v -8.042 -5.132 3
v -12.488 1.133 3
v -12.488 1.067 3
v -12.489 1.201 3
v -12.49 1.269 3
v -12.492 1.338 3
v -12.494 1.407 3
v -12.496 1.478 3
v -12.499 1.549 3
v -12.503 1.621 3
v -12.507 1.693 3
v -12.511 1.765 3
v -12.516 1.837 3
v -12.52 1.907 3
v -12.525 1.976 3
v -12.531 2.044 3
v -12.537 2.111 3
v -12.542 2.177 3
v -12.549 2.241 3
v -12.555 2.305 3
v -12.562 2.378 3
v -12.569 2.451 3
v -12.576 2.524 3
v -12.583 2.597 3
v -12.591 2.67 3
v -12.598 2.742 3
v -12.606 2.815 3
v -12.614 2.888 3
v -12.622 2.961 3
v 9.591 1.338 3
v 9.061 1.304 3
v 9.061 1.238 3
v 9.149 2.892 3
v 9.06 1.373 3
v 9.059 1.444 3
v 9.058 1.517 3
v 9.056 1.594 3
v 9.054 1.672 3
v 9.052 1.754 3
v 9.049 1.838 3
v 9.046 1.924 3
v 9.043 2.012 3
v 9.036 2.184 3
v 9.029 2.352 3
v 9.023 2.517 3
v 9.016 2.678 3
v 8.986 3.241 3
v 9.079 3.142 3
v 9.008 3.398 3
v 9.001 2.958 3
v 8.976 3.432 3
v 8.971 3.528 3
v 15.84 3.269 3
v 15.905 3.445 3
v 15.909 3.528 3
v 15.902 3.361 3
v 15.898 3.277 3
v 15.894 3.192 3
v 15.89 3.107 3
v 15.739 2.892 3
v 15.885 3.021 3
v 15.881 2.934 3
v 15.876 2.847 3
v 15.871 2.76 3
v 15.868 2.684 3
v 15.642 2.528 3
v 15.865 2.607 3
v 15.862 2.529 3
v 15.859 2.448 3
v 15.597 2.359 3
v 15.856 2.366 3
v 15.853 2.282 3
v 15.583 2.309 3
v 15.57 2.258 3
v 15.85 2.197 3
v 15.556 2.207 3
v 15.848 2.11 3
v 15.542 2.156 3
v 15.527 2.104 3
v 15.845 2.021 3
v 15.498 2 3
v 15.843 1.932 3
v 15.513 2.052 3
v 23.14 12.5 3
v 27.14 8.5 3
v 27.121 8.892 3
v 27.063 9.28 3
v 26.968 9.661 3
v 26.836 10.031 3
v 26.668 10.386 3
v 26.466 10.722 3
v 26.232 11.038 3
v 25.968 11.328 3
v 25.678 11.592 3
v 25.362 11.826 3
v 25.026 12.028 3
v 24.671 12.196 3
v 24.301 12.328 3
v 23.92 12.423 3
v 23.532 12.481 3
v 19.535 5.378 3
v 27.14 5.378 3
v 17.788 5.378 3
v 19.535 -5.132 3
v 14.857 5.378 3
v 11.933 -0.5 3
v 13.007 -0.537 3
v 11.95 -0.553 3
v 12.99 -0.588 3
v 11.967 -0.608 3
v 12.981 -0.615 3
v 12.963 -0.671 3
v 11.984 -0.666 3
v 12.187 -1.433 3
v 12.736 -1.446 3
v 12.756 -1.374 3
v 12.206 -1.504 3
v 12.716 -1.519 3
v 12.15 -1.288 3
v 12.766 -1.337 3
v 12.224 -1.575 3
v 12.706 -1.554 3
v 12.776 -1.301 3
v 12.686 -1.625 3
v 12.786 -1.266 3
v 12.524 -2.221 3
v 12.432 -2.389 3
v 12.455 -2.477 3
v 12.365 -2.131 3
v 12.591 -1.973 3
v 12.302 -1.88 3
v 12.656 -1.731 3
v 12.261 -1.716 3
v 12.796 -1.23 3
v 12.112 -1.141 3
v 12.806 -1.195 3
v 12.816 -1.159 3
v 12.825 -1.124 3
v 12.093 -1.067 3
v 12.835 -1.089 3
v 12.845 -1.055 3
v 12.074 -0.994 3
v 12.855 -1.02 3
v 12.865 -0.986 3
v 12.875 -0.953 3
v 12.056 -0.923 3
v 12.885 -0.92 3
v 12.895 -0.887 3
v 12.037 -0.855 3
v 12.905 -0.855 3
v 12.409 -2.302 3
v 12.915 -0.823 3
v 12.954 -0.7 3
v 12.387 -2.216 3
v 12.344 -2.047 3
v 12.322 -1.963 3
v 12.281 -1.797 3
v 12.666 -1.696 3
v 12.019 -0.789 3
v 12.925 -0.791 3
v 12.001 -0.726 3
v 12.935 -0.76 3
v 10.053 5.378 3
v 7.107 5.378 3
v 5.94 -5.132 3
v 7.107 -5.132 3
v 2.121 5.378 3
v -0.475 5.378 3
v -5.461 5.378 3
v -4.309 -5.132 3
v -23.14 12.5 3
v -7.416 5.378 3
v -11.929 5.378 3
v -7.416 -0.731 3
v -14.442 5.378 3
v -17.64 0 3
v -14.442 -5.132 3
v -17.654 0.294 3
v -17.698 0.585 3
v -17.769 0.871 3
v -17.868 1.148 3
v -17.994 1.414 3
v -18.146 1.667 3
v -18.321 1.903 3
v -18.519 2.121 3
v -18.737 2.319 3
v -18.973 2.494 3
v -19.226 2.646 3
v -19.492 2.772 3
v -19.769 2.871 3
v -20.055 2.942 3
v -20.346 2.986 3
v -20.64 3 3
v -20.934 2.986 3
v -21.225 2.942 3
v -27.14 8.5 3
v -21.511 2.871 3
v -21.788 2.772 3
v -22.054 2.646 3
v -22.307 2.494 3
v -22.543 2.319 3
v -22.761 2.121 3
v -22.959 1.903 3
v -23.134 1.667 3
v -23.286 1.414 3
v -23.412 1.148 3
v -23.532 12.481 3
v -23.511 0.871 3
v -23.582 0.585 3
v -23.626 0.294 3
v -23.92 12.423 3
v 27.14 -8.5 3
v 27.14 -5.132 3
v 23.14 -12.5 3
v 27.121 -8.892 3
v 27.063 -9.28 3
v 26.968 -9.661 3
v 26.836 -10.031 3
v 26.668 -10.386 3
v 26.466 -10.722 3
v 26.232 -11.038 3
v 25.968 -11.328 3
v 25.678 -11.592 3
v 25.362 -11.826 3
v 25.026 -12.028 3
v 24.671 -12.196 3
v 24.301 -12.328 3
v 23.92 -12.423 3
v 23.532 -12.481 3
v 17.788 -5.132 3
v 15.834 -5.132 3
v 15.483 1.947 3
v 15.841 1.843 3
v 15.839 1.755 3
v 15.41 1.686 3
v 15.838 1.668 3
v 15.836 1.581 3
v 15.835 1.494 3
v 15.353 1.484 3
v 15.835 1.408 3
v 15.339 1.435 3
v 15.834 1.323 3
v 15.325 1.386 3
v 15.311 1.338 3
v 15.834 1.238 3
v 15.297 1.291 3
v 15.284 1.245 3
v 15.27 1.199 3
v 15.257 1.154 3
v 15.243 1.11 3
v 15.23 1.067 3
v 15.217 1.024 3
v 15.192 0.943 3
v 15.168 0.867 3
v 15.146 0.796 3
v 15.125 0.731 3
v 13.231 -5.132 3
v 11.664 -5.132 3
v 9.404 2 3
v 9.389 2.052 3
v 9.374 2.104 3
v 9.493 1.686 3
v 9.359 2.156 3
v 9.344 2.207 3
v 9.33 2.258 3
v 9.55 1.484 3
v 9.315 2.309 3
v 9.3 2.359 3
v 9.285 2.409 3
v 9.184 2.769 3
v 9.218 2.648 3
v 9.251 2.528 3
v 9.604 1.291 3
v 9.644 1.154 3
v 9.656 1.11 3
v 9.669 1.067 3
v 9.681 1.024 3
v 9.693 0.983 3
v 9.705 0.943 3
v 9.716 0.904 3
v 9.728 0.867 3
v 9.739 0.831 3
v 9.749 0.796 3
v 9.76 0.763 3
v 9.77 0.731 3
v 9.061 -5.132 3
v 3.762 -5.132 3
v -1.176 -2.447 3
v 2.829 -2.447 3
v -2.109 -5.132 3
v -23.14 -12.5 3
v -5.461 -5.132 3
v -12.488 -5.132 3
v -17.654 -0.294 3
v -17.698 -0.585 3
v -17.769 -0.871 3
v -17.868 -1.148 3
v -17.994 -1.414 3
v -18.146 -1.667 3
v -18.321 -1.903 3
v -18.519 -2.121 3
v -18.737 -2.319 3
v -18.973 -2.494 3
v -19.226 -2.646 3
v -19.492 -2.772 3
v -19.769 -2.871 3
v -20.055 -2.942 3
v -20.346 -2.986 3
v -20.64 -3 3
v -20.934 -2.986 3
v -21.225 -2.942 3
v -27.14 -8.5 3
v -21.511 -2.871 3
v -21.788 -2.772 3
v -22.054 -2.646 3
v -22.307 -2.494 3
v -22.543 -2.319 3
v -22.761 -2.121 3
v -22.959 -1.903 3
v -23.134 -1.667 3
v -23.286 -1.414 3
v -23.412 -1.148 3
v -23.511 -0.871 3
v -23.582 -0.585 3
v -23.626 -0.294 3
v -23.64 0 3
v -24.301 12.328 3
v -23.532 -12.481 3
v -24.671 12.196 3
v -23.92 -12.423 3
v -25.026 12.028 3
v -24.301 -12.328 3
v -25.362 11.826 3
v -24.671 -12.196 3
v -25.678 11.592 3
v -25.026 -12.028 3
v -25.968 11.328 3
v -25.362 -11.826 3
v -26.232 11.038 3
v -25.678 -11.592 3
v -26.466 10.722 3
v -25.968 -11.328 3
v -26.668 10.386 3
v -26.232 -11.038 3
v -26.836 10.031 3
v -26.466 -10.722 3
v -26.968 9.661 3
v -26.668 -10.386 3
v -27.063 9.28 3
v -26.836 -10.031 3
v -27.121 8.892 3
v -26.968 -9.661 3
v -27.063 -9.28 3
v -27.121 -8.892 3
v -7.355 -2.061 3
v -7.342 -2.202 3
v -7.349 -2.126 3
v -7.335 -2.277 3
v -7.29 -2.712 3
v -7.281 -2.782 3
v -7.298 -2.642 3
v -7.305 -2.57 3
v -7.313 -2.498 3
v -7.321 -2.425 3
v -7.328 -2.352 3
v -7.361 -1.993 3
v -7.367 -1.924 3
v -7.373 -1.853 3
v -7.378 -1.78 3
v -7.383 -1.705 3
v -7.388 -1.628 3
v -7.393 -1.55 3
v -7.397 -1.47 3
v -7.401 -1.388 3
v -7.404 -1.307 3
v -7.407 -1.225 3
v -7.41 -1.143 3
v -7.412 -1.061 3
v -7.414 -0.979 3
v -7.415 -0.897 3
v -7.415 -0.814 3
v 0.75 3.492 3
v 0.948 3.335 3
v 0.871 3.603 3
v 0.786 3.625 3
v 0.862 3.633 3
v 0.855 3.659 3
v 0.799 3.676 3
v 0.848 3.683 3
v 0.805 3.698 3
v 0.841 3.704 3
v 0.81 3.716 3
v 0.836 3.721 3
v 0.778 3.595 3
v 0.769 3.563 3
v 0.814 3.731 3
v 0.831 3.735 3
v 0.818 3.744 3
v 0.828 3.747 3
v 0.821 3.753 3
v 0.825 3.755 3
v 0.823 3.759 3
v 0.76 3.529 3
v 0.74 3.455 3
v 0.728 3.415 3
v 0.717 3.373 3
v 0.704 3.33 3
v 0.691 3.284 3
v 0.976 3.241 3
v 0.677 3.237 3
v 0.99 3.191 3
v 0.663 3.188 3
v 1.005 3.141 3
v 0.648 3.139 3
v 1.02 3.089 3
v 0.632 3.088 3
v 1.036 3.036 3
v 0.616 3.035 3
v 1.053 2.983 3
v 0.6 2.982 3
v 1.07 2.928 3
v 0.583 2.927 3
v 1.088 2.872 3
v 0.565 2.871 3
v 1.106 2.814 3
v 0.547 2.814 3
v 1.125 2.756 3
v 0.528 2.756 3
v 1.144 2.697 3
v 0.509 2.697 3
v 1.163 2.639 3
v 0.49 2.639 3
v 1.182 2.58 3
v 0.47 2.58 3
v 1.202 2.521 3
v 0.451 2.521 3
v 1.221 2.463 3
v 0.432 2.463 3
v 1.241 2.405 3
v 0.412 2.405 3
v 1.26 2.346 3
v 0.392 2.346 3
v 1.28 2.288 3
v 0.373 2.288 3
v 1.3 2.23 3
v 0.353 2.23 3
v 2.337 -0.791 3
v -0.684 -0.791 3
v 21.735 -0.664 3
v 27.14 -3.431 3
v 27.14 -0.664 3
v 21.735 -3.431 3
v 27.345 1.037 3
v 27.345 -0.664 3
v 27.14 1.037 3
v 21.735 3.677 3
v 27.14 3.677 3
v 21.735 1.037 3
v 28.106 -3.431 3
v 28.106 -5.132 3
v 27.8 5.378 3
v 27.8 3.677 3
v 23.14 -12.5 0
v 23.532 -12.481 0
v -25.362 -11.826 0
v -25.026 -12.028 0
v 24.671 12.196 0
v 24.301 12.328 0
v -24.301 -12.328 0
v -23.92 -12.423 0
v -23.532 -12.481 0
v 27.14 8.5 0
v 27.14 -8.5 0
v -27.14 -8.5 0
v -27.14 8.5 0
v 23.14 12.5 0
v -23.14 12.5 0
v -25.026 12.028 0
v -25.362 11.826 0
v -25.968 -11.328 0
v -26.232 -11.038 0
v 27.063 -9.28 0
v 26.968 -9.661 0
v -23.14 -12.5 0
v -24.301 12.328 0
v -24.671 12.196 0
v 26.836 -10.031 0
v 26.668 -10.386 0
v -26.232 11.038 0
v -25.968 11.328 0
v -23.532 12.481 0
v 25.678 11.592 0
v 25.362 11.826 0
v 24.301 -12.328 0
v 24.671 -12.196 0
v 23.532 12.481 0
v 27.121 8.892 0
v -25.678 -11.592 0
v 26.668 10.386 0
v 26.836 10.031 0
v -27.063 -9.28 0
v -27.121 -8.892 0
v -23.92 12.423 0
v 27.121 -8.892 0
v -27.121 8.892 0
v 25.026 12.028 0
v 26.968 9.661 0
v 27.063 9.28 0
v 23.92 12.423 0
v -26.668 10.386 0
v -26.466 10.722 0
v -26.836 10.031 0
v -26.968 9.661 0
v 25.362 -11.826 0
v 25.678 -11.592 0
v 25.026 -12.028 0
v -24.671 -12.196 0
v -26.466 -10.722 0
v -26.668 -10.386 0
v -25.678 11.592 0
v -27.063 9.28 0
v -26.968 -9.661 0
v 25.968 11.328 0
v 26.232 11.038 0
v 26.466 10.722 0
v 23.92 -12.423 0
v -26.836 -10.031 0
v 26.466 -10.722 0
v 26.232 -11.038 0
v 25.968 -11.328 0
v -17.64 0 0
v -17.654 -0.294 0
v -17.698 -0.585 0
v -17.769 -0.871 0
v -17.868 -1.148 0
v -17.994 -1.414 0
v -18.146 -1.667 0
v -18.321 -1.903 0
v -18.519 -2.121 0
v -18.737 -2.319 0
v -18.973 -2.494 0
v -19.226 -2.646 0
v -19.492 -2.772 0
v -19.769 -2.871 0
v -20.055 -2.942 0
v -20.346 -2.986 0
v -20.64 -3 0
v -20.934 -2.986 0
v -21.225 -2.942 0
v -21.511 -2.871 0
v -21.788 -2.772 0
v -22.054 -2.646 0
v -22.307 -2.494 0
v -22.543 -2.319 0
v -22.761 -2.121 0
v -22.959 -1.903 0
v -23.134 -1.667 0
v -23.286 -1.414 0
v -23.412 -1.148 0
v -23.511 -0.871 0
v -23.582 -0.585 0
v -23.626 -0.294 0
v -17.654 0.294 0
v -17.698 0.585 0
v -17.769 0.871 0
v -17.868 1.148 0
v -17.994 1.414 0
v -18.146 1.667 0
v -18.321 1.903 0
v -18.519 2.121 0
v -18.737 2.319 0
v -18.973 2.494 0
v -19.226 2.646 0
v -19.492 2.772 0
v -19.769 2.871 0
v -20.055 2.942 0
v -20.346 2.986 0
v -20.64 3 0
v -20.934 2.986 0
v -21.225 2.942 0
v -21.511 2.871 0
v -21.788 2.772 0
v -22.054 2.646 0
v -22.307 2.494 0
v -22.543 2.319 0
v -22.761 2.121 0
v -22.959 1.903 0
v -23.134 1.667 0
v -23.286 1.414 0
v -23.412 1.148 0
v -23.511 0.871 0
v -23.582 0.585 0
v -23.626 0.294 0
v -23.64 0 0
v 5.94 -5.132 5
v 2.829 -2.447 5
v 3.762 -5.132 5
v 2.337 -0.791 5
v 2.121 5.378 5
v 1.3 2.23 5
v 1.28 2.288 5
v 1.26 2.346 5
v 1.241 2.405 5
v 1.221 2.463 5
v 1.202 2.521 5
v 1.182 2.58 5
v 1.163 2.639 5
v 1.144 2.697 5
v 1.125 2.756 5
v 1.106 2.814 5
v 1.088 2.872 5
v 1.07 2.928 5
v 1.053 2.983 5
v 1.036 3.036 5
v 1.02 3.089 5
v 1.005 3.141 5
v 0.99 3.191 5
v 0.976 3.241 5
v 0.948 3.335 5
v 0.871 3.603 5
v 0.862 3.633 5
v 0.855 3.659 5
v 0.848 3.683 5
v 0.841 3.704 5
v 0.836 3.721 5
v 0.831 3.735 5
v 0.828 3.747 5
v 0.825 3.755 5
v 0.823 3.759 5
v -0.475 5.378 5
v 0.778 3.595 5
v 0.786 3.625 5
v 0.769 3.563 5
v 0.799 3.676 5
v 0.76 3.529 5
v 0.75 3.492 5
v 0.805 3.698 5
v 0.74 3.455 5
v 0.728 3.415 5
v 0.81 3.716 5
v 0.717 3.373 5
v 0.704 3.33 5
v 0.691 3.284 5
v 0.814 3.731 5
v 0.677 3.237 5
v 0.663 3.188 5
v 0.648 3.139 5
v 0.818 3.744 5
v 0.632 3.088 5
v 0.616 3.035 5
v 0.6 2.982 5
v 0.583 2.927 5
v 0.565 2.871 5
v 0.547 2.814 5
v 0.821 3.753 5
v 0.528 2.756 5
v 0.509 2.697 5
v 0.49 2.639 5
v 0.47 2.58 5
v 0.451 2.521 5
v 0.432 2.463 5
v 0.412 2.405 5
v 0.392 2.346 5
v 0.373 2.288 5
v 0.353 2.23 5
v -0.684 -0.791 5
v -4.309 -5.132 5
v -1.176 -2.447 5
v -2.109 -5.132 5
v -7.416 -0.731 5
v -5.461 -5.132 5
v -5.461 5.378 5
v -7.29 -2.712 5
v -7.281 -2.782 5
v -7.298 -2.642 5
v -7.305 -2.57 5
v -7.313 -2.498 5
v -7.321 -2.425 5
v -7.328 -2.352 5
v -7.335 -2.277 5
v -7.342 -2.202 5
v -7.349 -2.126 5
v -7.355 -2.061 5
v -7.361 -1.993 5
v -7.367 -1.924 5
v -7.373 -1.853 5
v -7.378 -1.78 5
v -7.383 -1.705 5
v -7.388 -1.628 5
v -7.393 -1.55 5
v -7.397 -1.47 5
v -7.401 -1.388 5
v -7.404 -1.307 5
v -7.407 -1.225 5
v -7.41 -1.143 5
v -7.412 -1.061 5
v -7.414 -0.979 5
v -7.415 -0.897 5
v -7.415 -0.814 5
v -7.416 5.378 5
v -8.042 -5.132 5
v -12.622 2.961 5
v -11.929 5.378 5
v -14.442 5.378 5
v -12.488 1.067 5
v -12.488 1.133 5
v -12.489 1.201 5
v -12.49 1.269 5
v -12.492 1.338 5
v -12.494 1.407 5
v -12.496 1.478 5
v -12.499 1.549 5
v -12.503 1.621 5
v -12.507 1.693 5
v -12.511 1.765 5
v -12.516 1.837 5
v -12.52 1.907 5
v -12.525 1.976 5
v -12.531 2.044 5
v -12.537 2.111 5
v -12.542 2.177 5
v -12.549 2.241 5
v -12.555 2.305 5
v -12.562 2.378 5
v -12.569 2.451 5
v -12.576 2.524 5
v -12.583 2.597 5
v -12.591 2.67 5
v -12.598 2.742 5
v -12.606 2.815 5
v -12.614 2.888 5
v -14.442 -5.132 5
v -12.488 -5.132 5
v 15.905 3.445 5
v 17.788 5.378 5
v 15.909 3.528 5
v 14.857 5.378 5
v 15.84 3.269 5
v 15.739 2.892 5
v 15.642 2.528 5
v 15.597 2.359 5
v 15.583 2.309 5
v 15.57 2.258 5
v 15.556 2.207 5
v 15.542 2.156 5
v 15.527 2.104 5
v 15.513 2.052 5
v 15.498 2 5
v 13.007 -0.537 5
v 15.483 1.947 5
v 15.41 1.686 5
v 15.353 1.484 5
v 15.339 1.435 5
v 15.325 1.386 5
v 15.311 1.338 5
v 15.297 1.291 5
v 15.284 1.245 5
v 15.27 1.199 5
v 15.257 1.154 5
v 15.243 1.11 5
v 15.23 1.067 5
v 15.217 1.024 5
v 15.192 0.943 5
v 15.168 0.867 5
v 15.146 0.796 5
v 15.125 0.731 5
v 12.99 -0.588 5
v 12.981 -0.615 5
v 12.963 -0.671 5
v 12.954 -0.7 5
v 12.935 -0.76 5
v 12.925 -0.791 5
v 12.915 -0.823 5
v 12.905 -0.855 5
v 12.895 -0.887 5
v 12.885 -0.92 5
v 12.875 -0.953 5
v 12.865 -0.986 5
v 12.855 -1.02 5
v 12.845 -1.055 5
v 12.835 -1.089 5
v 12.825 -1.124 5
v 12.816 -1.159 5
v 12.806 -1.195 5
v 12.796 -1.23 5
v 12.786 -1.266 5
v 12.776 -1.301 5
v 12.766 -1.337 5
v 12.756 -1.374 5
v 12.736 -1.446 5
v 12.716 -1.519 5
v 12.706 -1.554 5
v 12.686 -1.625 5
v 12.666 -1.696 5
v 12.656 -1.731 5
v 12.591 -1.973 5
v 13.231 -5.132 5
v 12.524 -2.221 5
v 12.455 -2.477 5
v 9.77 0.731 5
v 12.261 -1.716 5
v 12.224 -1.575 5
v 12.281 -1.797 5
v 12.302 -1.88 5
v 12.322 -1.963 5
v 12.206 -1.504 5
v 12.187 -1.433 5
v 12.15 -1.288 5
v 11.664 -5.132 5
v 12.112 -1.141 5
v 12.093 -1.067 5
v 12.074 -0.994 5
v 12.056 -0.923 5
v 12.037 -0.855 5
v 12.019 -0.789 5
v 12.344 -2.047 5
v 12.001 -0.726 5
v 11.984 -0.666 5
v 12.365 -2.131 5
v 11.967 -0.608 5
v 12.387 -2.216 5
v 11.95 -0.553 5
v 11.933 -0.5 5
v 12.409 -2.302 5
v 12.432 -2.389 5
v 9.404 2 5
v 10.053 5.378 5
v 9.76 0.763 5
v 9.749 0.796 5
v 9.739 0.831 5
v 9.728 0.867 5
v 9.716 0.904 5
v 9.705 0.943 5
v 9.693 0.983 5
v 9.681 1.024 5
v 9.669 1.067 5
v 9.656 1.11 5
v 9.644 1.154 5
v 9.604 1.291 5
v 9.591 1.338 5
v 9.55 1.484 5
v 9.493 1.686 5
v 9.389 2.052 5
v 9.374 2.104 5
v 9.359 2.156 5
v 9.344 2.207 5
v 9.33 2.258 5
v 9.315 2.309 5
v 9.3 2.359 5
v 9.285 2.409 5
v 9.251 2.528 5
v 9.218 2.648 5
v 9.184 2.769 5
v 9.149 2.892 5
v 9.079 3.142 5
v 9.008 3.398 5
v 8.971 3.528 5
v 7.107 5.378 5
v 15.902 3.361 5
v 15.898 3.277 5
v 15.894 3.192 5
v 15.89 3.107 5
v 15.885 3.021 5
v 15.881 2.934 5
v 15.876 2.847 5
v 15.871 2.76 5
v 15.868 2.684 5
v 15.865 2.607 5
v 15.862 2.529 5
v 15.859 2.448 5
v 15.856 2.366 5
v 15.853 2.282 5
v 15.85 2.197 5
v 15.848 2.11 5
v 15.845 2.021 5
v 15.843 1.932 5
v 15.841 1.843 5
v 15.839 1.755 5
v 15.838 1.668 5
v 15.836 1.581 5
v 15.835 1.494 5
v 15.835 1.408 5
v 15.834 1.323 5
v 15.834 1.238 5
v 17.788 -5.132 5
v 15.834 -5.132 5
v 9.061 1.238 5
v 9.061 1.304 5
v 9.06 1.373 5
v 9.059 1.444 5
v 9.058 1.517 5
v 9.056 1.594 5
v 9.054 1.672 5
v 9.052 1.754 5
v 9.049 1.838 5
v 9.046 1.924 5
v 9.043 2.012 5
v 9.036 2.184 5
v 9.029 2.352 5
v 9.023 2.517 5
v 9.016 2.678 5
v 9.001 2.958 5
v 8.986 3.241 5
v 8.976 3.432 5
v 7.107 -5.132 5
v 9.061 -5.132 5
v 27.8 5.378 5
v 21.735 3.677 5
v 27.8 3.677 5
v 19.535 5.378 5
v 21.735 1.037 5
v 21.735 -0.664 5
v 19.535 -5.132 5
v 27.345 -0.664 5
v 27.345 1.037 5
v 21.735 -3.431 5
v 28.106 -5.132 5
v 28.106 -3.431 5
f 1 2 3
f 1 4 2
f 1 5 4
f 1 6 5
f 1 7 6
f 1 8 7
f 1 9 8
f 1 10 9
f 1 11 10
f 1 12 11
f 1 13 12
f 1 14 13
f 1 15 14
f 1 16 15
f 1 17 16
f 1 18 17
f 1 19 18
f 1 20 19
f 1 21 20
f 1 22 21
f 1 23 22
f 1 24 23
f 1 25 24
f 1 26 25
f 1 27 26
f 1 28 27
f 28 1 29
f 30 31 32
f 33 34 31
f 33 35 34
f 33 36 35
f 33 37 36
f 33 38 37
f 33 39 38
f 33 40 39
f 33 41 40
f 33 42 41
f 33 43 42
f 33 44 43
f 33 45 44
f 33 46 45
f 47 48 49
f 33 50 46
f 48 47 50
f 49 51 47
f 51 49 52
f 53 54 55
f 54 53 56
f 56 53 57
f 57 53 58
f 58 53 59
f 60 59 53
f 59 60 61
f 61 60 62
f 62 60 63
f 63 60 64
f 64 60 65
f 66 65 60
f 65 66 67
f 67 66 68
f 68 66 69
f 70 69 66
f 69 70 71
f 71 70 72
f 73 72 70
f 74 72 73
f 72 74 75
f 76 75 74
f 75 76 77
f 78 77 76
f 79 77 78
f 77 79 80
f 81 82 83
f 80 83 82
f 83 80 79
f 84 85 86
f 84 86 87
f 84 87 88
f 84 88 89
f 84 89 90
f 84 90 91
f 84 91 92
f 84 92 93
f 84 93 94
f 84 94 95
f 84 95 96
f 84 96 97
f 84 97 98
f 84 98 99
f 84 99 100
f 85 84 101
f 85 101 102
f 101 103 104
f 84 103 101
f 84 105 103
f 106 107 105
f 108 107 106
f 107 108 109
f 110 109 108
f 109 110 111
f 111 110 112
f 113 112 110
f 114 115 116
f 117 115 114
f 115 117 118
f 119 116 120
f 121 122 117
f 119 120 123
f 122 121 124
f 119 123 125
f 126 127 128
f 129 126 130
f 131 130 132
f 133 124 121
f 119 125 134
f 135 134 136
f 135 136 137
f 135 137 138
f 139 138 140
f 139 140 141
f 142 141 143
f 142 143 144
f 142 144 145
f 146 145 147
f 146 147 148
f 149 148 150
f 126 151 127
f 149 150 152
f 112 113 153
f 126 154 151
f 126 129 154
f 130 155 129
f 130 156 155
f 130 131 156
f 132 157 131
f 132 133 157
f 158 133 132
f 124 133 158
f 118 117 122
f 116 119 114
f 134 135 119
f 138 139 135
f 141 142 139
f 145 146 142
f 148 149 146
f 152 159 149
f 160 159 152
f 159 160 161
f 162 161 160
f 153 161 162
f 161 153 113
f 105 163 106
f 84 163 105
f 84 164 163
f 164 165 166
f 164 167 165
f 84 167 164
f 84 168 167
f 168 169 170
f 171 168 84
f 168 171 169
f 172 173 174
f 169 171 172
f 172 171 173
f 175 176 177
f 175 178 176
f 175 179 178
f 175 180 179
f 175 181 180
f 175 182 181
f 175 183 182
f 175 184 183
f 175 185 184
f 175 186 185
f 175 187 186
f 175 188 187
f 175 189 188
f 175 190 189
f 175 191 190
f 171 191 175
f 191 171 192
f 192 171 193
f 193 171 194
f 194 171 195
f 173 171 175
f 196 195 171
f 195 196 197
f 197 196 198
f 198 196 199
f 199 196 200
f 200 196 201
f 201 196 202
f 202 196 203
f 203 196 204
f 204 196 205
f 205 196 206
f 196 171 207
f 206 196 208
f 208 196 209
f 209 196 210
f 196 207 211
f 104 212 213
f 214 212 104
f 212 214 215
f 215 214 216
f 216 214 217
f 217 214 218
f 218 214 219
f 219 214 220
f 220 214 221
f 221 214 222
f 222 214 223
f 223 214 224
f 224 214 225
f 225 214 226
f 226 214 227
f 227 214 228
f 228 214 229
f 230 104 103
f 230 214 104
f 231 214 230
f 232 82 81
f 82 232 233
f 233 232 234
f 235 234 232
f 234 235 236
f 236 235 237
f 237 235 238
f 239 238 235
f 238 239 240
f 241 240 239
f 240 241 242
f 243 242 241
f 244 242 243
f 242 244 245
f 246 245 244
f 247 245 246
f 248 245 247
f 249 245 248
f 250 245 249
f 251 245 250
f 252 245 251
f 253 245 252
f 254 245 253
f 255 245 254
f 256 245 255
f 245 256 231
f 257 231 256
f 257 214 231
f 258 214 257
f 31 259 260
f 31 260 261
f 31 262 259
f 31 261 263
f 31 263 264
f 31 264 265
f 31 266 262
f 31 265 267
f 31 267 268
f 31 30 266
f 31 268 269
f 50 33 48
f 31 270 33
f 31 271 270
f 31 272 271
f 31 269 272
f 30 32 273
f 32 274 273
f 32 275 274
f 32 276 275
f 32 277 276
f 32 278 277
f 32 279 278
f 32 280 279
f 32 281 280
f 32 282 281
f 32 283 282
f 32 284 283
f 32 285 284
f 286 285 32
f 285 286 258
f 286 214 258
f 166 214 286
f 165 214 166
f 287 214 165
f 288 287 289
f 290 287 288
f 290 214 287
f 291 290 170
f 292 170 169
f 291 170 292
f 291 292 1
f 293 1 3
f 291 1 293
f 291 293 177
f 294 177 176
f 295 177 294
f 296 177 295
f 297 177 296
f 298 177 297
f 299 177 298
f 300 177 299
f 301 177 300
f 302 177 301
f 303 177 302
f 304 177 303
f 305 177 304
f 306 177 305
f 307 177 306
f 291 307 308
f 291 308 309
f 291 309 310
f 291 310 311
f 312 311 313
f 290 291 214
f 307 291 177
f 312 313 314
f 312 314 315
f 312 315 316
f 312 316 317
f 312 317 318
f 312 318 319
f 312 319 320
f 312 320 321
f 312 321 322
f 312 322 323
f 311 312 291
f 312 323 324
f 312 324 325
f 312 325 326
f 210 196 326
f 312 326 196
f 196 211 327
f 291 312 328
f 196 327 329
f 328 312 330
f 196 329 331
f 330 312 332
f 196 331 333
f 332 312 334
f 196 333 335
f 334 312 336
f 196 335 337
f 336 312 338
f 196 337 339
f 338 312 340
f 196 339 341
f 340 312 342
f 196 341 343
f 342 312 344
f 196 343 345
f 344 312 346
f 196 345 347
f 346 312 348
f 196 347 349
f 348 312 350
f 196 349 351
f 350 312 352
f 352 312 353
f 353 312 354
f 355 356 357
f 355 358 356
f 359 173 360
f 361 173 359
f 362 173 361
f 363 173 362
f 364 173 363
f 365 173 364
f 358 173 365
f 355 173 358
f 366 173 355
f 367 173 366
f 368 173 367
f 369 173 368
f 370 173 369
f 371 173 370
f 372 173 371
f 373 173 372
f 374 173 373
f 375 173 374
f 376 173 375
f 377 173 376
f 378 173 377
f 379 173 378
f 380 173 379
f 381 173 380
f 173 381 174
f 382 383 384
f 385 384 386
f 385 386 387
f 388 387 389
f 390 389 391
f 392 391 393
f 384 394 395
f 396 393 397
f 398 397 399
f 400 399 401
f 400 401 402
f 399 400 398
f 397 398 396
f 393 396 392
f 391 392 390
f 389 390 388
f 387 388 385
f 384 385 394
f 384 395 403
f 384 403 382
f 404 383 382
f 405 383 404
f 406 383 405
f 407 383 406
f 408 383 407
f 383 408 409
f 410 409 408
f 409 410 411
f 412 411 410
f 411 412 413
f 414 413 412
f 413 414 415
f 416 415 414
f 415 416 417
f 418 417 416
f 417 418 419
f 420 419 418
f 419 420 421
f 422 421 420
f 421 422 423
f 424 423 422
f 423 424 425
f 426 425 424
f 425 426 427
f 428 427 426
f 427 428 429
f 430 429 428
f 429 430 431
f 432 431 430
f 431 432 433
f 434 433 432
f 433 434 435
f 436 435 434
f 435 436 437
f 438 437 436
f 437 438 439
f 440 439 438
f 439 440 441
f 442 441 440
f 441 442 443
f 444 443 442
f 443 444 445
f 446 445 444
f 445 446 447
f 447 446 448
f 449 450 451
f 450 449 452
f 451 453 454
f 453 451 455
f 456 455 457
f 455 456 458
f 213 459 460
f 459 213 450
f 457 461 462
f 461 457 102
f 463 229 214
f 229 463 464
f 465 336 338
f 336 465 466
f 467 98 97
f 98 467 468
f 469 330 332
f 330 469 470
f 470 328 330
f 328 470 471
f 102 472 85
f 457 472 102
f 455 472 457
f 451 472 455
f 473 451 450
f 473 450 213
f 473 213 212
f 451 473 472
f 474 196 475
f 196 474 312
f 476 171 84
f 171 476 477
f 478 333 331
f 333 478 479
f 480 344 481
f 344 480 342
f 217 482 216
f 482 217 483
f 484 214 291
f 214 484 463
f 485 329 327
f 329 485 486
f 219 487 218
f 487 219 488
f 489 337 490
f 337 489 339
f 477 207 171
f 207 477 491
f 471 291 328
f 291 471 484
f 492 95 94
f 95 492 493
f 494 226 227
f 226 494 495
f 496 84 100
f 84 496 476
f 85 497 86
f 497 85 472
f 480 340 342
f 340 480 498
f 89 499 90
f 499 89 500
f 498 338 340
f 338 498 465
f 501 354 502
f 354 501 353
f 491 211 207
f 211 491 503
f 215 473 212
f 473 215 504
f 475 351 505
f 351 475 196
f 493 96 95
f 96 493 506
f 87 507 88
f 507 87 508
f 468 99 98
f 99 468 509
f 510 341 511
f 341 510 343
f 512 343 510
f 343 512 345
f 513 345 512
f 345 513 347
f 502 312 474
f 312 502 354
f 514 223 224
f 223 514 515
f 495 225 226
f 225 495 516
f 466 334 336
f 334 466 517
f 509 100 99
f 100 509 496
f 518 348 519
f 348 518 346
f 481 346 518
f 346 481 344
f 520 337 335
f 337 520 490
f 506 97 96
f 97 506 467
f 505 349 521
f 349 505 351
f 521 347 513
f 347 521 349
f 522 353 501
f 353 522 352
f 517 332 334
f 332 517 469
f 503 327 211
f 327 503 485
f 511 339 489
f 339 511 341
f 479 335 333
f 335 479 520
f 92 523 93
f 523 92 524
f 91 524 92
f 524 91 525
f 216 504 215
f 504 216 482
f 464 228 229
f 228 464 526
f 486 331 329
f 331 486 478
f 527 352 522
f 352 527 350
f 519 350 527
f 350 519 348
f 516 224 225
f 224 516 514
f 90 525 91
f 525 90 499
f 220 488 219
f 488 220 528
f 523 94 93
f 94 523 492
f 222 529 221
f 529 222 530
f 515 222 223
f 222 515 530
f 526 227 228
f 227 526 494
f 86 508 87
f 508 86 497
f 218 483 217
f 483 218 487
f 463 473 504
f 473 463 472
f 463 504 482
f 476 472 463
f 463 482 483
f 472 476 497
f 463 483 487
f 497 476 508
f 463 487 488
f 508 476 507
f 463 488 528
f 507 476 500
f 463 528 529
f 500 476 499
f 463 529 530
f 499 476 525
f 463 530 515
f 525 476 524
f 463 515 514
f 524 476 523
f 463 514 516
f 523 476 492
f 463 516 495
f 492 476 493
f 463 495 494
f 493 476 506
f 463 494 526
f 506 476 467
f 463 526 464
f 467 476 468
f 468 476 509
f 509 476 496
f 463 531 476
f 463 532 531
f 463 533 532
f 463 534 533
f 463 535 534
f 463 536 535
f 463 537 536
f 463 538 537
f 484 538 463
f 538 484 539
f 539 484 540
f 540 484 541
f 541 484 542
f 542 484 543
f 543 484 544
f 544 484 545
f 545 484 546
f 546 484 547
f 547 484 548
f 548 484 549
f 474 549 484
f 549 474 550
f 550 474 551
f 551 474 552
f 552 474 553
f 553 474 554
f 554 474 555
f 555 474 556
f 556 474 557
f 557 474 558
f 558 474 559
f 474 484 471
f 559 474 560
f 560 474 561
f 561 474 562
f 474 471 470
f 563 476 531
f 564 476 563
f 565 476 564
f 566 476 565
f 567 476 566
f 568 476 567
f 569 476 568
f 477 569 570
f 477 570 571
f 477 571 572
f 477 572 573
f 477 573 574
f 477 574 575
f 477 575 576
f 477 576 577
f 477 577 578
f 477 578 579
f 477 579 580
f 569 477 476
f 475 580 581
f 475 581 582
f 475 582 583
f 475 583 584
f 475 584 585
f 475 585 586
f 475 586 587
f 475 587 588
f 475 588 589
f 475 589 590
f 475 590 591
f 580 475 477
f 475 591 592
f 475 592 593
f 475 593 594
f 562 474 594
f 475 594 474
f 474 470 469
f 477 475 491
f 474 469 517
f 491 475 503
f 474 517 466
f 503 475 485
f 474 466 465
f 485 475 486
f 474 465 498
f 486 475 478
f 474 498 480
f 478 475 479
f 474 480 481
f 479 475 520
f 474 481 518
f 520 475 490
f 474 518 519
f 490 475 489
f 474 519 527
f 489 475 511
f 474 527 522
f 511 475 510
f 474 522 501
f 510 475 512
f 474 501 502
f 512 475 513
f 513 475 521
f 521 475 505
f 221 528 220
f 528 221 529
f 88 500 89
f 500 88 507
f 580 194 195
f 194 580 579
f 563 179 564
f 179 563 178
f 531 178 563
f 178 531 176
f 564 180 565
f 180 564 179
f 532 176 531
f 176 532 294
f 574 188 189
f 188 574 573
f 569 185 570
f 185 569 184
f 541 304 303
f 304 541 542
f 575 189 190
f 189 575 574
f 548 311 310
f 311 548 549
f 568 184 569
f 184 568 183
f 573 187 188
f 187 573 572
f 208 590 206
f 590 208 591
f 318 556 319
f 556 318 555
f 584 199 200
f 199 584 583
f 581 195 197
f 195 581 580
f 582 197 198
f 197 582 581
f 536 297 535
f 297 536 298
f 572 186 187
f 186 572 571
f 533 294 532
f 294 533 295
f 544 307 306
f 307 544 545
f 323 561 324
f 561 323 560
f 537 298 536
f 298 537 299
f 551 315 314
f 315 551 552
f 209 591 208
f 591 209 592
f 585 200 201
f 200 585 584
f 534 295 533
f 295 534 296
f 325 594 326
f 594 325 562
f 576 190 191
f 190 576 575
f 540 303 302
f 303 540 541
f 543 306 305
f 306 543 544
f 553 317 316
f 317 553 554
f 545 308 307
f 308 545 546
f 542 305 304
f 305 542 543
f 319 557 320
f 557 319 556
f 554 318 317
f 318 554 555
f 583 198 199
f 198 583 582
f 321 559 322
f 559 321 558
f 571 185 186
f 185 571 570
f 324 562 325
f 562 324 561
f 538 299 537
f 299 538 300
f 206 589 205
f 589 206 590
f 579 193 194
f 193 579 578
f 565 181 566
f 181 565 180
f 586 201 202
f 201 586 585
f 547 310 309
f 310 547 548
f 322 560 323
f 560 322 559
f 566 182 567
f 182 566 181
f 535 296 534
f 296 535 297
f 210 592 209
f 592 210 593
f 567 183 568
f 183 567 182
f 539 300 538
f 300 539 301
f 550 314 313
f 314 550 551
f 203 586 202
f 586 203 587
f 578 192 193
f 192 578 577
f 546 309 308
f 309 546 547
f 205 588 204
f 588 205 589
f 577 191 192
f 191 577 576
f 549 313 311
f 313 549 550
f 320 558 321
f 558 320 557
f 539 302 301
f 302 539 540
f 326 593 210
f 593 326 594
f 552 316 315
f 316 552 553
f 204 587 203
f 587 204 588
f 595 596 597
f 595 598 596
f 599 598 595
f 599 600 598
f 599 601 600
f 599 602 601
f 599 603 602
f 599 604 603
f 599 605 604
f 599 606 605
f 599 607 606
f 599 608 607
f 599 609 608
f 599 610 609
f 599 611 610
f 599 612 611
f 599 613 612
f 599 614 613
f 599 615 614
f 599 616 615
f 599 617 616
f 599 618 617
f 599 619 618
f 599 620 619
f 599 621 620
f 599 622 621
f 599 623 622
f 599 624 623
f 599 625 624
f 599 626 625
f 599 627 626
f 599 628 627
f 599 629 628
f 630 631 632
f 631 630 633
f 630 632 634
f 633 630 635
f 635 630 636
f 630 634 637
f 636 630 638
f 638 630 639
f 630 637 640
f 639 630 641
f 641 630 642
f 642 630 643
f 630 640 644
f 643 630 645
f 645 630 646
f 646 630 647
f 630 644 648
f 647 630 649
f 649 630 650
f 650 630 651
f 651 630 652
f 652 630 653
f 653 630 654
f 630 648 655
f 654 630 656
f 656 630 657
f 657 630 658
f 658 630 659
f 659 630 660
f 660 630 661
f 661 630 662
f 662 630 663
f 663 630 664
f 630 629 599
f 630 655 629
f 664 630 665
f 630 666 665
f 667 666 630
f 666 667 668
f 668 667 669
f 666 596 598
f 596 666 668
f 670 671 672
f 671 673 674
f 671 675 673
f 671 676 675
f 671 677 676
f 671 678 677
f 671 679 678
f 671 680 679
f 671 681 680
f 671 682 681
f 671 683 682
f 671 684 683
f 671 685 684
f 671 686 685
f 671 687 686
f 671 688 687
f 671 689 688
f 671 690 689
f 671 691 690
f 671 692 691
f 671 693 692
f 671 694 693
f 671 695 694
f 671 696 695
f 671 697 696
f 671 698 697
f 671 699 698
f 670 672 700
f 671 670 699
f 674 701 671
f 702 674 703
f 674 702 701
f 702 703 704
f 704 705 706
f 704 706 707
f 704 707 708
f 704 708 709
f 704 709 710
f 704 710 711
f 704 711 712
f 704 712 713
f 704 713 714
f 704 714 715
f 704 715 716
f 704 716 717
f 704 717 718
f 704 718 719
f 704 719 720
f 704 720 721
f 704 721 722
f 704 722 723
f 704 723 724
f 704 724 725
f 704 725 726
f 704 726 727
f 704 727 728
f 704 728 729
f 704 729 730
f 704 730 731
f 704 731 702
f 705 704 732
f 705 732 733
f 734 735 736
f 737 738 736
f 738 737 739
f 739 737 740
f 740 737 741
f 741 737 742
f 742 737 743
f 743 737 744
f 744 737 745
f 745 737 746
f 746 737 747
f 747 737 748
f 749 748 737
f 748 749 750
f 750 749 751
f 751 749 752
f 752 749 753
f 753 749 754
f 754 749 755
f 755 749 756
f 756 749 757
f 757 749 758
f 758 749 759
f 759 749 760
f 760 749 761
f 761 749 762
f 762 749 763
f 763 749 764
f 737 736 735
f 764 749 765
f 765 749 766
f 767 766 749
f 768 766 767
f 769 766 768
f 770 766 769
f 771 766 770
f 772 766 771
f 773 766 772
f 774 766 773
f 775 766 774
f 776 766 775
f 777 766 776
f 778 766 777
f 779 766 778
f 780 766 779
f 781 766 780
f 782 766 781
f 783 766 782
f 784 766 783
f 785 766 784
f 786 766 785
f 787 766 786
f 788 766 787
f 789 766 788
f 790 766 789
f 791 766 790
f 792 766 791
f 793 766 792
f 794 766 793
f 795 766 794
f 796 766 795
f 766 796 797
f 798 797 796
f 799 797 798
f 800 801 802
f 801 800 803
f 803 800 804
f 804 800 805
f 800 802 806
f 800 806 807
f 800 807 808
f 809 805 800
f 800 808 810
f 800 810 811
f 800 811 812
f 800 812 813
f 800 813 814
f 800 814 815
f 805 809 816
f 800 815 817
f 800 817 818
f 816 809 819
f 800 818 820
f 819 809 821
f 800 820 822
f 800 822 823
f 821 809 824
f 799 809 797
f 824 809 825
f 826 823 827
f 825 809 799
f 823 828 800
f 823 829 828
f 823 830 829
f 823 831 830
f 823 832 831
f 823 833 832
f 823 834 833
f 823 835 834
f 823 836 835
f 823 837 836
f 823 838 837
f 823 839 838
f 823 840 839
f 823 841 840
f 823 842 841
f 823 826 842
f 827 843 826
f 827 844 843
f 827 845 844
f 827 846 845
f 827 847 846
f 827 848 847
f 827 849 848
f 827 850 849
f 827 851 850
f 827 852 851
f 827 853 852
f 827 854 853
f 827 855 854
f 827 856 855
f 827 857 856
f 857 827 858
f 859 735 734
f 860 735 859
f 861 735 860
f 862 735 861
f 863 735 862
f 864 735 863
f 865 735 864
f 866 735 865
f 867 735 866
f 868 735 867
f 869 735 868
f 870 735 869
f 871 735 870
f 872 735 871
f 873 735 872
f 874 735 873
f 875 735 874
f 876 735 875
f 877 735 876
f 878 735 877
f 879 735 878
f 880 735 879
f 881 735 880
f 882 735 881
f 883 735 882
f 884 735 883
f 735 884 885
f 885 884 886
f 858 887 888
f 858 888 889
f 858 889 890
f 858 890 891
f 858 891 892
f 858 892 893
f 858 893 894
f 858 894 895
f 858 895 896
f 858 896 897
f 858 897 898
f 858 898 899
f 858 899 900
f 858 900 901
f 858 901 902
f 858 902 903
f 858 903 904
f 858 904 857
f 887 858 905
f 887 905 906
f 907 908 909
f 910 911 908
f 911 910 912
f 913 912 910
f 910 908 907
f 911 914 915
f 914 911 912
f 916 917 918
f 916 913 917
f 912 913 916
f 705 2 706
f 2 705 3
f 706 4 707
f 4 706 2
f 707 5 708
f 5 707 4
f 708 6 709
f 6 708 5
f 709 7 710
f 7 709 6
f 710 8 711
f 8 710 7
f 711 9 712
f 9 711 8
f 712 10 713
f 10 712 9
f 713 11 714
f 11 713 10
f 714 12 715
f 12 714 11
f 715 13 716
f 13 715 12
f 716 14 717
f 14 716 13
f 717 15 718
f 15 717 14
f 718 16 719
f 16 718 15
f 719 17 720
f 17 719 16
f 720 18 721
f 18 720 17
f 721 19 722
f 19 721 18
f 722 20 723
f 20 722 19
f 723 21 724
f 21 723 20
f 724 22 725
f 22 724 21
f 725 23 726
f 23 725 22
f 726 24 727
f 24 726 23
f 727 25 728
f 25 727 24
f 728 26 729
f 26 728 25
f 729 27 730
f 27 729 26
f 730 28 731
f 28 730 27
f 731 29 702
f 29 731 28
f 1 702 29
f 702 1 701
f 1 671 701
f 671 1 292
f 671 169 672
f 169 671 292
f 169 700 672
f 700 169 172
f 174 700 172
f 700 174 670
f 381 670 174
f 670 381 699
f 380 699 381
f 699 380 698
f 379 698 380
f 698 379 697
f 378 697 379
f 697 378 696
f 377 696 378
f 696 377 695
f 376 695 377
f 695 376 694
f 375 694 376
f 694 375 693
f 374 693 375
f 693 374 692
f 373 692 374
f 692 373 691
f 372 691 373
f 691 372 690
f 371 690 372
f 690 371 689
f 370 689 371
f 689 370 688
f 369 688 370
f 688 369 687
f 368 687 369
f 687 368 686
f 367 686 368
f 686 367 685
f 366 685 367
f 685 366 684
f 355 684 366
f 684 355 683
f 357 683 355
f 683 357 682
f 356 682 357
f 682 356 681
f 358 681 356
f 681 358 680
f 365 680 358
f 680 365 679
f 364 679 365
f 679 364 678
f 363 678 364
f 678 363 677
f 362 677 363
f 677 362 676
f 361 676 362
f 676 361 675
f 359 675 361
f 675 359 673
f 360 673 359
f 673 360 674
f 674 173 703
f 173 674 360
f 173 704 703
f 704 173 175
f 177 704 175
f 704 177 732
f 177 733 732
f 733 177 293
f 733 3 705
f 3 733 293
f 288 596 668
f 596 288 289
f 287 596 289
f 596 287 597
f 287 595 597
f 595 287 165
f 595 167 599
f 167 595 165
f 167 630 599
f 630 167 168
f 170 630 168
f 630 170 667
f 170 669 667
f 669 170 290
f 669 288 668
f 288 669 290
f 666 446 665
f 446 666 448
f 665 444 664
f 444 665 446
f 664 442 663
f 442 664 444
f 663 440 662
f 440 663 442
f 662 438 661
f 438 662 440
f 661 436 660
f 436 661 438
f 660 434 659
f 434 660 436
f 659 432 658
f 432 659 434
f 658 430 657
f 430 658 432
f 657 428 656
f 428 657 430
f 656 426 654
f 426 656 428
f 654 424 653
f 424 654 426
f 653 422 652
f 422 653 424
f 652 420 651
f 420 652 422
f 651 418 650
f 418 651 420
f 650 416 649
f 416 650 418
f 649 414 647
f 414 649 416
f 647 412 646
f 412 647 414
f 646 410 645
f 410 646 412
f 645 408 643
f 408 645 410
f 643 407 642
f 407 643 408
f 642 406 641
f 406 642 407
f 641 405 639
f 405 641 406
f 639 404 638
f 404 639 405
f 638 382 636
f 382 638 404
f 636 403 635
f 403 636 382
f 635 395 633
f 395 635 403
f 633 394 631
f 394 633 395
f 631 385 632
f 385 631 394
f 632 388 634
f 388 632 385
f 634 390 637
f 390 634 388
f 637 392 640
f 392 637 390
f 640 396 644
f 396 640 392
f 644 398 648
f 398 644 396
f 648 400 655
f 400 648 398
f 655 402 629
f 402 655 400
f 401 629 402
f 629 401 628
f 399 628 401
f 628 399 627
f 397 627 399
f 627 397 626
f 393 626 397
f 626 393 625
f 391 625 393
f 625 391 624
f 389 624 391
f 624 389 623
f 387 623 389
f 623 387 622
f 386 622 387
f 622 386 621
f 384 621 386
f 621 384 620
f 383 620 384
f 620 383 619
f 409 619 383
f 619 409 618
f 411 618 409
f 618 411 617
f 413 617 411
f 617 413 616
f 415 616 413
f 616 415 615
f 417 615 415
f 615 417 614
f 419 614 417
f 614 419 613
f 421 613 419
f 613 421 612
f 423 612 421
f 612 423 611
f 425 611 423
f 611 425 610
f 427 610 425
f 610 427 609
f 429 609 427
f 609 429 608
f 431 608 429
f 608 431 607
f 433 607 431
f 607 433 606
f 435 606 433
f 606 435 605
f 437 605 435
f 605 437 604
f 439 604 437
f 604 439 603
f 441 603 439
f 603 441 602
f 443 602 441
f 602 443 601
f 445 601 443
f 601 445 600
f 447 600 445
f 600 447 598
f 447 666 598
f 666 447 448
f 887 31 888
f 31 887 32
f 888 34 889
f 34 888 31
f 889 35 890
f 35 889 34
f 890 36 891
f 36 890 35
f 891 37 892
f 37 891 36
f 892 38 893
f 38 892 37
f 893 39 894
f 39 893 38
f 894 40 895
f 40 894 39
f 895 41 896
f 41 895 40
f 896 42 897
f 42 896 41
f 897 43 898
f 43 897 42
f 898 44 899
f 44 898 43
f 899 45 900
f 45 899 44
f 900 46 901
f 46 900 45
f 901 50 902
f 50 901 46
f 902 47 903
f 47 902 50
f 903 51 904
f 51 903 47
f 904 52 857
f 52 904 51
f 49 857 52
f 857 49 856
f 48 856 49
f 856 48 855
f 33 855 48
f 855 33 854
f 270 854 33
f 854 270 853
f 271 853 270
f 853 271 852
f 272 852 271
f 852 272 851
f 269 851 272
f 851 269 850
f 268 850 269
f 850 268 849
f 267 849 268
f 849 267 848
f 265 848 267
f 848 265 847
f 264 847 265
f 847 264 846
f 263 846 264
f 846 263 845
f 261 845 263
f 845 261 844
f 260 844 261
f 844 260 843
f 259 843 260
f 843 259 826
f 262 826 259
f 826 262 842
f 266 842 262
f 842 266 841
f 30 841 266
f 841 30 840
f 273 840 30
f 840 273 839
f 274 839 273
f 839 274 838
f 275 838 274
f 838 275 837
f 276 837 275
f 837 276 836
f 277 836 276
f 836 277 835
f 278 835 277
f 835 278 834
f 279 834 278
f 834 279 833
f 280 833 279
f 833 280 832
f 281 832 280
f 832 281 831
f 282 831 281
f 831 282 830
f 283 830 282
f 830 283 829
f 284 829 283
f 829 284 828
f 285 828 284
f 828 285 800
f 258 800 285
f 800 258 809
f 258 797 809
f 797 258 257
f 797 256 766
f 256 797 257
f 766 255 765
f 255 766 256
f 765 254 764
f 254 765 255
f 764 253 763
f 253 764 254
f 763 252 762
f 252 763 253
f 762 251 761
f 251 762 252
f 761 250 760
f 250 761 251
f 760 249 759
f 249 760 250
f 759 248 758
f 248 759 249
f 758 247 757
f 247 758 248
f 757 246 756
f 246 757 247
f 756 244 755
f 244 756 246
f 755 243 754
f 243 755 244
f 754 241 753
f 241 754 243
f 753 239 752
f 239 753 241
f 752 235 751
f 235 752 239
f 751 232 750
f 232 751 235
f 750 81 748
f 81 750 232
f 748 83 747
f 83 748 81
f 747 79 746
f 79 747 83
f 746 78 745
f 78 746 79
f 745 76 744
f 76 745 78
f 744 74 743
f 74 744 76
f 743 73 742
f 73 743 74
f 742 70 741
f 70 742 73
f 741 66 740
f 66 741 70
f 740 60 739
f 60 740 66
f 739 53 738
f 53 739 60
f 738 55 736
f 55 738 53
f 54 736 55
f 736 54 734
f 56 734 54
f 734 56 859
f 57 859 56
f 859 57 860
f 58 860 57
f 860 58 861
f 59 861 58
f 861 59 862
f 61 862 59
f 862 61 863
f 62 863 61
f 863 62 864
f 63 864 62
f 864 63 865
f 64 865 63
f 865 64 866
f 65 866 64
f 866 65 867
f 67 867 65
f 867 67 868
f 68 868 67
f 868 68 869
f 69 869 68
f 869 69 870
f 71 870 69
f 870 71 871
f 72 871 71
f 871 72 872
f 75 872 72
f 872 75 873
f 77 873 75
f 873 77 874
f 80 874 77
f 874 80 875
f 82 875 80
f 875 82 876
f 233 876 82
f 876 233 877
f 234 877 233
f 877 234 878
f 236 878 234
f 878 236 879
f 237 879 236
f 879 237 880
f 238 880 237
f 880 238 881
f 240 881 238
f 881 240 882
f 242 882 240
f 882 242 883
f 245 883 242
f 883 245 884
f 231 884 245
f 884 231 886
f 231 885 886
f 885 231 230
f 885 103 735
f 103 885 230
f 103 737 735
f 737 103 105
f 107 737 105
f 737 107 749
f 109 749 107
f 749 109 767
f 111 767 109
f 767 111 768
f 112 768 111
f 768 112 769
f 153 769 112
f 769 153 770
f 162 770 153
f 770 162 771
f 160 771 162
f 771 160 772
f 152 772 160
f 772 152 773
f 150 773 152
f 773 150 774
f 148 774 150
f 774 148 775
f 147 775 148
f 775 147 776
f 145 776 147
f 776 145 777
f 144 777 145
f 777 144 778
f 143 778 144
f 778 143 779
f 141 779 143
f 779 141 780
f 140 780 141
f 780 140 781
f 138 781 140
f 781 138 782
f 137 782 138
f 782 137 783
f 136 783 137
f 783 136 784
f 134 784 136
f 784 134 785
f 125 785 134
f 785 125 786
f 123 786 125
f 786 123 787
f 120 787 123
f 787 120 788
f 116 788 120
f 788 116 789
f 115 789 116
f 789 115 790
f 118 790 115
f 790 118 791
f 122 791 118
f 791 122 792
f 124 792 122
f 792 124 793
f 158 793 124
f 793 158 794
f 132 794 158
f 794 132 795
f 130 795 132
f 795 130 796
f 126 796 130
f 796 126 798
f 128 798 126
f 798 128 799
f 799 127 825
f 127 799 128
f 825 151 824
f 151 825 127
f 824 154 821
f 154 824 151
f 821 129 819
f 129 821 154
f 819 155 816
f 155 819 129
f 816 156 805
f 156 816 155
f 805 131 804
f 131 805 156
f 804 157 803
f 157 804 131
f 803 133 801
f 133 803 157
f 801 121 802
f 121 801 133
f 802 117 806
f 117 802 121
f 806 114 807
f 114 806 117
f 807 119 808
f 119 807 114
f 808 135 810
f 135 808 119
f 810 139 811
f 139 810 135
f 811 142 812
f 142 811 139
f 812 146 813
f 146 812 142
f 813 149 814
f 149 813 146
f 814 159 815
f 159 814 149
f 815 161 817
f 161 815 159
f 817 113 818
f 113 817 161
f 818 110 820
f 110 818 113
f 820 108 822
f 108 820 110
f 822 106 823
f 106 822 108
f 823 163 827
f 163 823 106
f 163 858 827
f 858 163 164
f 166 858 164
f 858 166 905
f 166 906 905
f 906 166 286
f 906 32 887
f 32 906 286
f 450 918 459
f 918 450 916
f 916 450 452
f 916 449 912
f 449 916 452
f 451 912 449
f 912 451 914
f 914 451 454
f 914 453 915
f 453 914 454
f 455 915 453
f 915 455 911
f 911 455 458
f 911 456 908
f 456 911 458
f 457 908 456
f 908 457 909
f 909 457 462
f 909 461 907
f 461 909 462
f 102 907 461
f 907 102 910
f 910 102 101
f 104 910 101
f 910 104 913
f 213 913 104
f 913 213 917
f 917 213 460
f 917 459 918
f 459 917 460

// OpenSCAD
// ============================================================
//  LuxeStyle - Parametrischer Namens-Schluesselanhaenger
//  Rendern:  openscad -o out.stl -D 'txt="Mia"' keychain.scad
//  Bequemer: python3 make.py keychain "Mia"
// ============================================================

/* [Text] */
txt         = "NAME";                       // Wunschtext (per -D ueberschreiben)
font        = "Liberation Sans:style=Bold"; // System-Schrift
text_size   = 11;   // Schrifthoehe in mm
text_thick  = 2;    // Hoehe des erhabenen Textes in mm

/* [Platte] */
plate_thick = 3;    // Dicke der Grundplatte in mm
margin      = 7;    // Rand um den Text in mm
corner_r    = 4;    // Eckenradius in mm

/* [Ring-Loch] */
ring_d      = 6;    // Durchmesser des Aufhaenge-Lochs in mm

/* [Qualitaet] */
$fn = 64;

est_text_w = max(len(txt), 1) * text_size * 0.62;
ring_zone  = ring_d + margin;
plate_w    = est_text_w + 2 * margin + ring_zone;
plate_h    = text_size + 2 * margin;

module rounded_rect(w, h, r) {
    offset(r) offset(-r) square([w, h], center = true);
}

module plate() {
    difference() {
        linear_extrude(plate_thick)
            rounded_rect(plate_w, plate_h, corner_r);
        translate([-plate_w / 2 + ring_zone / 2, 0, -1])
            cylinder(d = ring_d, h = plate_thick + 2);
    }
}

module label() {
    translate([ring_zone / 2, 0, plate_thick])
        linear_extrude(text_thick)
            text(txt, size = text_size, font = font,
                 halign = "center", valign = "center");
}

union() {
    plate();
    label();
}
